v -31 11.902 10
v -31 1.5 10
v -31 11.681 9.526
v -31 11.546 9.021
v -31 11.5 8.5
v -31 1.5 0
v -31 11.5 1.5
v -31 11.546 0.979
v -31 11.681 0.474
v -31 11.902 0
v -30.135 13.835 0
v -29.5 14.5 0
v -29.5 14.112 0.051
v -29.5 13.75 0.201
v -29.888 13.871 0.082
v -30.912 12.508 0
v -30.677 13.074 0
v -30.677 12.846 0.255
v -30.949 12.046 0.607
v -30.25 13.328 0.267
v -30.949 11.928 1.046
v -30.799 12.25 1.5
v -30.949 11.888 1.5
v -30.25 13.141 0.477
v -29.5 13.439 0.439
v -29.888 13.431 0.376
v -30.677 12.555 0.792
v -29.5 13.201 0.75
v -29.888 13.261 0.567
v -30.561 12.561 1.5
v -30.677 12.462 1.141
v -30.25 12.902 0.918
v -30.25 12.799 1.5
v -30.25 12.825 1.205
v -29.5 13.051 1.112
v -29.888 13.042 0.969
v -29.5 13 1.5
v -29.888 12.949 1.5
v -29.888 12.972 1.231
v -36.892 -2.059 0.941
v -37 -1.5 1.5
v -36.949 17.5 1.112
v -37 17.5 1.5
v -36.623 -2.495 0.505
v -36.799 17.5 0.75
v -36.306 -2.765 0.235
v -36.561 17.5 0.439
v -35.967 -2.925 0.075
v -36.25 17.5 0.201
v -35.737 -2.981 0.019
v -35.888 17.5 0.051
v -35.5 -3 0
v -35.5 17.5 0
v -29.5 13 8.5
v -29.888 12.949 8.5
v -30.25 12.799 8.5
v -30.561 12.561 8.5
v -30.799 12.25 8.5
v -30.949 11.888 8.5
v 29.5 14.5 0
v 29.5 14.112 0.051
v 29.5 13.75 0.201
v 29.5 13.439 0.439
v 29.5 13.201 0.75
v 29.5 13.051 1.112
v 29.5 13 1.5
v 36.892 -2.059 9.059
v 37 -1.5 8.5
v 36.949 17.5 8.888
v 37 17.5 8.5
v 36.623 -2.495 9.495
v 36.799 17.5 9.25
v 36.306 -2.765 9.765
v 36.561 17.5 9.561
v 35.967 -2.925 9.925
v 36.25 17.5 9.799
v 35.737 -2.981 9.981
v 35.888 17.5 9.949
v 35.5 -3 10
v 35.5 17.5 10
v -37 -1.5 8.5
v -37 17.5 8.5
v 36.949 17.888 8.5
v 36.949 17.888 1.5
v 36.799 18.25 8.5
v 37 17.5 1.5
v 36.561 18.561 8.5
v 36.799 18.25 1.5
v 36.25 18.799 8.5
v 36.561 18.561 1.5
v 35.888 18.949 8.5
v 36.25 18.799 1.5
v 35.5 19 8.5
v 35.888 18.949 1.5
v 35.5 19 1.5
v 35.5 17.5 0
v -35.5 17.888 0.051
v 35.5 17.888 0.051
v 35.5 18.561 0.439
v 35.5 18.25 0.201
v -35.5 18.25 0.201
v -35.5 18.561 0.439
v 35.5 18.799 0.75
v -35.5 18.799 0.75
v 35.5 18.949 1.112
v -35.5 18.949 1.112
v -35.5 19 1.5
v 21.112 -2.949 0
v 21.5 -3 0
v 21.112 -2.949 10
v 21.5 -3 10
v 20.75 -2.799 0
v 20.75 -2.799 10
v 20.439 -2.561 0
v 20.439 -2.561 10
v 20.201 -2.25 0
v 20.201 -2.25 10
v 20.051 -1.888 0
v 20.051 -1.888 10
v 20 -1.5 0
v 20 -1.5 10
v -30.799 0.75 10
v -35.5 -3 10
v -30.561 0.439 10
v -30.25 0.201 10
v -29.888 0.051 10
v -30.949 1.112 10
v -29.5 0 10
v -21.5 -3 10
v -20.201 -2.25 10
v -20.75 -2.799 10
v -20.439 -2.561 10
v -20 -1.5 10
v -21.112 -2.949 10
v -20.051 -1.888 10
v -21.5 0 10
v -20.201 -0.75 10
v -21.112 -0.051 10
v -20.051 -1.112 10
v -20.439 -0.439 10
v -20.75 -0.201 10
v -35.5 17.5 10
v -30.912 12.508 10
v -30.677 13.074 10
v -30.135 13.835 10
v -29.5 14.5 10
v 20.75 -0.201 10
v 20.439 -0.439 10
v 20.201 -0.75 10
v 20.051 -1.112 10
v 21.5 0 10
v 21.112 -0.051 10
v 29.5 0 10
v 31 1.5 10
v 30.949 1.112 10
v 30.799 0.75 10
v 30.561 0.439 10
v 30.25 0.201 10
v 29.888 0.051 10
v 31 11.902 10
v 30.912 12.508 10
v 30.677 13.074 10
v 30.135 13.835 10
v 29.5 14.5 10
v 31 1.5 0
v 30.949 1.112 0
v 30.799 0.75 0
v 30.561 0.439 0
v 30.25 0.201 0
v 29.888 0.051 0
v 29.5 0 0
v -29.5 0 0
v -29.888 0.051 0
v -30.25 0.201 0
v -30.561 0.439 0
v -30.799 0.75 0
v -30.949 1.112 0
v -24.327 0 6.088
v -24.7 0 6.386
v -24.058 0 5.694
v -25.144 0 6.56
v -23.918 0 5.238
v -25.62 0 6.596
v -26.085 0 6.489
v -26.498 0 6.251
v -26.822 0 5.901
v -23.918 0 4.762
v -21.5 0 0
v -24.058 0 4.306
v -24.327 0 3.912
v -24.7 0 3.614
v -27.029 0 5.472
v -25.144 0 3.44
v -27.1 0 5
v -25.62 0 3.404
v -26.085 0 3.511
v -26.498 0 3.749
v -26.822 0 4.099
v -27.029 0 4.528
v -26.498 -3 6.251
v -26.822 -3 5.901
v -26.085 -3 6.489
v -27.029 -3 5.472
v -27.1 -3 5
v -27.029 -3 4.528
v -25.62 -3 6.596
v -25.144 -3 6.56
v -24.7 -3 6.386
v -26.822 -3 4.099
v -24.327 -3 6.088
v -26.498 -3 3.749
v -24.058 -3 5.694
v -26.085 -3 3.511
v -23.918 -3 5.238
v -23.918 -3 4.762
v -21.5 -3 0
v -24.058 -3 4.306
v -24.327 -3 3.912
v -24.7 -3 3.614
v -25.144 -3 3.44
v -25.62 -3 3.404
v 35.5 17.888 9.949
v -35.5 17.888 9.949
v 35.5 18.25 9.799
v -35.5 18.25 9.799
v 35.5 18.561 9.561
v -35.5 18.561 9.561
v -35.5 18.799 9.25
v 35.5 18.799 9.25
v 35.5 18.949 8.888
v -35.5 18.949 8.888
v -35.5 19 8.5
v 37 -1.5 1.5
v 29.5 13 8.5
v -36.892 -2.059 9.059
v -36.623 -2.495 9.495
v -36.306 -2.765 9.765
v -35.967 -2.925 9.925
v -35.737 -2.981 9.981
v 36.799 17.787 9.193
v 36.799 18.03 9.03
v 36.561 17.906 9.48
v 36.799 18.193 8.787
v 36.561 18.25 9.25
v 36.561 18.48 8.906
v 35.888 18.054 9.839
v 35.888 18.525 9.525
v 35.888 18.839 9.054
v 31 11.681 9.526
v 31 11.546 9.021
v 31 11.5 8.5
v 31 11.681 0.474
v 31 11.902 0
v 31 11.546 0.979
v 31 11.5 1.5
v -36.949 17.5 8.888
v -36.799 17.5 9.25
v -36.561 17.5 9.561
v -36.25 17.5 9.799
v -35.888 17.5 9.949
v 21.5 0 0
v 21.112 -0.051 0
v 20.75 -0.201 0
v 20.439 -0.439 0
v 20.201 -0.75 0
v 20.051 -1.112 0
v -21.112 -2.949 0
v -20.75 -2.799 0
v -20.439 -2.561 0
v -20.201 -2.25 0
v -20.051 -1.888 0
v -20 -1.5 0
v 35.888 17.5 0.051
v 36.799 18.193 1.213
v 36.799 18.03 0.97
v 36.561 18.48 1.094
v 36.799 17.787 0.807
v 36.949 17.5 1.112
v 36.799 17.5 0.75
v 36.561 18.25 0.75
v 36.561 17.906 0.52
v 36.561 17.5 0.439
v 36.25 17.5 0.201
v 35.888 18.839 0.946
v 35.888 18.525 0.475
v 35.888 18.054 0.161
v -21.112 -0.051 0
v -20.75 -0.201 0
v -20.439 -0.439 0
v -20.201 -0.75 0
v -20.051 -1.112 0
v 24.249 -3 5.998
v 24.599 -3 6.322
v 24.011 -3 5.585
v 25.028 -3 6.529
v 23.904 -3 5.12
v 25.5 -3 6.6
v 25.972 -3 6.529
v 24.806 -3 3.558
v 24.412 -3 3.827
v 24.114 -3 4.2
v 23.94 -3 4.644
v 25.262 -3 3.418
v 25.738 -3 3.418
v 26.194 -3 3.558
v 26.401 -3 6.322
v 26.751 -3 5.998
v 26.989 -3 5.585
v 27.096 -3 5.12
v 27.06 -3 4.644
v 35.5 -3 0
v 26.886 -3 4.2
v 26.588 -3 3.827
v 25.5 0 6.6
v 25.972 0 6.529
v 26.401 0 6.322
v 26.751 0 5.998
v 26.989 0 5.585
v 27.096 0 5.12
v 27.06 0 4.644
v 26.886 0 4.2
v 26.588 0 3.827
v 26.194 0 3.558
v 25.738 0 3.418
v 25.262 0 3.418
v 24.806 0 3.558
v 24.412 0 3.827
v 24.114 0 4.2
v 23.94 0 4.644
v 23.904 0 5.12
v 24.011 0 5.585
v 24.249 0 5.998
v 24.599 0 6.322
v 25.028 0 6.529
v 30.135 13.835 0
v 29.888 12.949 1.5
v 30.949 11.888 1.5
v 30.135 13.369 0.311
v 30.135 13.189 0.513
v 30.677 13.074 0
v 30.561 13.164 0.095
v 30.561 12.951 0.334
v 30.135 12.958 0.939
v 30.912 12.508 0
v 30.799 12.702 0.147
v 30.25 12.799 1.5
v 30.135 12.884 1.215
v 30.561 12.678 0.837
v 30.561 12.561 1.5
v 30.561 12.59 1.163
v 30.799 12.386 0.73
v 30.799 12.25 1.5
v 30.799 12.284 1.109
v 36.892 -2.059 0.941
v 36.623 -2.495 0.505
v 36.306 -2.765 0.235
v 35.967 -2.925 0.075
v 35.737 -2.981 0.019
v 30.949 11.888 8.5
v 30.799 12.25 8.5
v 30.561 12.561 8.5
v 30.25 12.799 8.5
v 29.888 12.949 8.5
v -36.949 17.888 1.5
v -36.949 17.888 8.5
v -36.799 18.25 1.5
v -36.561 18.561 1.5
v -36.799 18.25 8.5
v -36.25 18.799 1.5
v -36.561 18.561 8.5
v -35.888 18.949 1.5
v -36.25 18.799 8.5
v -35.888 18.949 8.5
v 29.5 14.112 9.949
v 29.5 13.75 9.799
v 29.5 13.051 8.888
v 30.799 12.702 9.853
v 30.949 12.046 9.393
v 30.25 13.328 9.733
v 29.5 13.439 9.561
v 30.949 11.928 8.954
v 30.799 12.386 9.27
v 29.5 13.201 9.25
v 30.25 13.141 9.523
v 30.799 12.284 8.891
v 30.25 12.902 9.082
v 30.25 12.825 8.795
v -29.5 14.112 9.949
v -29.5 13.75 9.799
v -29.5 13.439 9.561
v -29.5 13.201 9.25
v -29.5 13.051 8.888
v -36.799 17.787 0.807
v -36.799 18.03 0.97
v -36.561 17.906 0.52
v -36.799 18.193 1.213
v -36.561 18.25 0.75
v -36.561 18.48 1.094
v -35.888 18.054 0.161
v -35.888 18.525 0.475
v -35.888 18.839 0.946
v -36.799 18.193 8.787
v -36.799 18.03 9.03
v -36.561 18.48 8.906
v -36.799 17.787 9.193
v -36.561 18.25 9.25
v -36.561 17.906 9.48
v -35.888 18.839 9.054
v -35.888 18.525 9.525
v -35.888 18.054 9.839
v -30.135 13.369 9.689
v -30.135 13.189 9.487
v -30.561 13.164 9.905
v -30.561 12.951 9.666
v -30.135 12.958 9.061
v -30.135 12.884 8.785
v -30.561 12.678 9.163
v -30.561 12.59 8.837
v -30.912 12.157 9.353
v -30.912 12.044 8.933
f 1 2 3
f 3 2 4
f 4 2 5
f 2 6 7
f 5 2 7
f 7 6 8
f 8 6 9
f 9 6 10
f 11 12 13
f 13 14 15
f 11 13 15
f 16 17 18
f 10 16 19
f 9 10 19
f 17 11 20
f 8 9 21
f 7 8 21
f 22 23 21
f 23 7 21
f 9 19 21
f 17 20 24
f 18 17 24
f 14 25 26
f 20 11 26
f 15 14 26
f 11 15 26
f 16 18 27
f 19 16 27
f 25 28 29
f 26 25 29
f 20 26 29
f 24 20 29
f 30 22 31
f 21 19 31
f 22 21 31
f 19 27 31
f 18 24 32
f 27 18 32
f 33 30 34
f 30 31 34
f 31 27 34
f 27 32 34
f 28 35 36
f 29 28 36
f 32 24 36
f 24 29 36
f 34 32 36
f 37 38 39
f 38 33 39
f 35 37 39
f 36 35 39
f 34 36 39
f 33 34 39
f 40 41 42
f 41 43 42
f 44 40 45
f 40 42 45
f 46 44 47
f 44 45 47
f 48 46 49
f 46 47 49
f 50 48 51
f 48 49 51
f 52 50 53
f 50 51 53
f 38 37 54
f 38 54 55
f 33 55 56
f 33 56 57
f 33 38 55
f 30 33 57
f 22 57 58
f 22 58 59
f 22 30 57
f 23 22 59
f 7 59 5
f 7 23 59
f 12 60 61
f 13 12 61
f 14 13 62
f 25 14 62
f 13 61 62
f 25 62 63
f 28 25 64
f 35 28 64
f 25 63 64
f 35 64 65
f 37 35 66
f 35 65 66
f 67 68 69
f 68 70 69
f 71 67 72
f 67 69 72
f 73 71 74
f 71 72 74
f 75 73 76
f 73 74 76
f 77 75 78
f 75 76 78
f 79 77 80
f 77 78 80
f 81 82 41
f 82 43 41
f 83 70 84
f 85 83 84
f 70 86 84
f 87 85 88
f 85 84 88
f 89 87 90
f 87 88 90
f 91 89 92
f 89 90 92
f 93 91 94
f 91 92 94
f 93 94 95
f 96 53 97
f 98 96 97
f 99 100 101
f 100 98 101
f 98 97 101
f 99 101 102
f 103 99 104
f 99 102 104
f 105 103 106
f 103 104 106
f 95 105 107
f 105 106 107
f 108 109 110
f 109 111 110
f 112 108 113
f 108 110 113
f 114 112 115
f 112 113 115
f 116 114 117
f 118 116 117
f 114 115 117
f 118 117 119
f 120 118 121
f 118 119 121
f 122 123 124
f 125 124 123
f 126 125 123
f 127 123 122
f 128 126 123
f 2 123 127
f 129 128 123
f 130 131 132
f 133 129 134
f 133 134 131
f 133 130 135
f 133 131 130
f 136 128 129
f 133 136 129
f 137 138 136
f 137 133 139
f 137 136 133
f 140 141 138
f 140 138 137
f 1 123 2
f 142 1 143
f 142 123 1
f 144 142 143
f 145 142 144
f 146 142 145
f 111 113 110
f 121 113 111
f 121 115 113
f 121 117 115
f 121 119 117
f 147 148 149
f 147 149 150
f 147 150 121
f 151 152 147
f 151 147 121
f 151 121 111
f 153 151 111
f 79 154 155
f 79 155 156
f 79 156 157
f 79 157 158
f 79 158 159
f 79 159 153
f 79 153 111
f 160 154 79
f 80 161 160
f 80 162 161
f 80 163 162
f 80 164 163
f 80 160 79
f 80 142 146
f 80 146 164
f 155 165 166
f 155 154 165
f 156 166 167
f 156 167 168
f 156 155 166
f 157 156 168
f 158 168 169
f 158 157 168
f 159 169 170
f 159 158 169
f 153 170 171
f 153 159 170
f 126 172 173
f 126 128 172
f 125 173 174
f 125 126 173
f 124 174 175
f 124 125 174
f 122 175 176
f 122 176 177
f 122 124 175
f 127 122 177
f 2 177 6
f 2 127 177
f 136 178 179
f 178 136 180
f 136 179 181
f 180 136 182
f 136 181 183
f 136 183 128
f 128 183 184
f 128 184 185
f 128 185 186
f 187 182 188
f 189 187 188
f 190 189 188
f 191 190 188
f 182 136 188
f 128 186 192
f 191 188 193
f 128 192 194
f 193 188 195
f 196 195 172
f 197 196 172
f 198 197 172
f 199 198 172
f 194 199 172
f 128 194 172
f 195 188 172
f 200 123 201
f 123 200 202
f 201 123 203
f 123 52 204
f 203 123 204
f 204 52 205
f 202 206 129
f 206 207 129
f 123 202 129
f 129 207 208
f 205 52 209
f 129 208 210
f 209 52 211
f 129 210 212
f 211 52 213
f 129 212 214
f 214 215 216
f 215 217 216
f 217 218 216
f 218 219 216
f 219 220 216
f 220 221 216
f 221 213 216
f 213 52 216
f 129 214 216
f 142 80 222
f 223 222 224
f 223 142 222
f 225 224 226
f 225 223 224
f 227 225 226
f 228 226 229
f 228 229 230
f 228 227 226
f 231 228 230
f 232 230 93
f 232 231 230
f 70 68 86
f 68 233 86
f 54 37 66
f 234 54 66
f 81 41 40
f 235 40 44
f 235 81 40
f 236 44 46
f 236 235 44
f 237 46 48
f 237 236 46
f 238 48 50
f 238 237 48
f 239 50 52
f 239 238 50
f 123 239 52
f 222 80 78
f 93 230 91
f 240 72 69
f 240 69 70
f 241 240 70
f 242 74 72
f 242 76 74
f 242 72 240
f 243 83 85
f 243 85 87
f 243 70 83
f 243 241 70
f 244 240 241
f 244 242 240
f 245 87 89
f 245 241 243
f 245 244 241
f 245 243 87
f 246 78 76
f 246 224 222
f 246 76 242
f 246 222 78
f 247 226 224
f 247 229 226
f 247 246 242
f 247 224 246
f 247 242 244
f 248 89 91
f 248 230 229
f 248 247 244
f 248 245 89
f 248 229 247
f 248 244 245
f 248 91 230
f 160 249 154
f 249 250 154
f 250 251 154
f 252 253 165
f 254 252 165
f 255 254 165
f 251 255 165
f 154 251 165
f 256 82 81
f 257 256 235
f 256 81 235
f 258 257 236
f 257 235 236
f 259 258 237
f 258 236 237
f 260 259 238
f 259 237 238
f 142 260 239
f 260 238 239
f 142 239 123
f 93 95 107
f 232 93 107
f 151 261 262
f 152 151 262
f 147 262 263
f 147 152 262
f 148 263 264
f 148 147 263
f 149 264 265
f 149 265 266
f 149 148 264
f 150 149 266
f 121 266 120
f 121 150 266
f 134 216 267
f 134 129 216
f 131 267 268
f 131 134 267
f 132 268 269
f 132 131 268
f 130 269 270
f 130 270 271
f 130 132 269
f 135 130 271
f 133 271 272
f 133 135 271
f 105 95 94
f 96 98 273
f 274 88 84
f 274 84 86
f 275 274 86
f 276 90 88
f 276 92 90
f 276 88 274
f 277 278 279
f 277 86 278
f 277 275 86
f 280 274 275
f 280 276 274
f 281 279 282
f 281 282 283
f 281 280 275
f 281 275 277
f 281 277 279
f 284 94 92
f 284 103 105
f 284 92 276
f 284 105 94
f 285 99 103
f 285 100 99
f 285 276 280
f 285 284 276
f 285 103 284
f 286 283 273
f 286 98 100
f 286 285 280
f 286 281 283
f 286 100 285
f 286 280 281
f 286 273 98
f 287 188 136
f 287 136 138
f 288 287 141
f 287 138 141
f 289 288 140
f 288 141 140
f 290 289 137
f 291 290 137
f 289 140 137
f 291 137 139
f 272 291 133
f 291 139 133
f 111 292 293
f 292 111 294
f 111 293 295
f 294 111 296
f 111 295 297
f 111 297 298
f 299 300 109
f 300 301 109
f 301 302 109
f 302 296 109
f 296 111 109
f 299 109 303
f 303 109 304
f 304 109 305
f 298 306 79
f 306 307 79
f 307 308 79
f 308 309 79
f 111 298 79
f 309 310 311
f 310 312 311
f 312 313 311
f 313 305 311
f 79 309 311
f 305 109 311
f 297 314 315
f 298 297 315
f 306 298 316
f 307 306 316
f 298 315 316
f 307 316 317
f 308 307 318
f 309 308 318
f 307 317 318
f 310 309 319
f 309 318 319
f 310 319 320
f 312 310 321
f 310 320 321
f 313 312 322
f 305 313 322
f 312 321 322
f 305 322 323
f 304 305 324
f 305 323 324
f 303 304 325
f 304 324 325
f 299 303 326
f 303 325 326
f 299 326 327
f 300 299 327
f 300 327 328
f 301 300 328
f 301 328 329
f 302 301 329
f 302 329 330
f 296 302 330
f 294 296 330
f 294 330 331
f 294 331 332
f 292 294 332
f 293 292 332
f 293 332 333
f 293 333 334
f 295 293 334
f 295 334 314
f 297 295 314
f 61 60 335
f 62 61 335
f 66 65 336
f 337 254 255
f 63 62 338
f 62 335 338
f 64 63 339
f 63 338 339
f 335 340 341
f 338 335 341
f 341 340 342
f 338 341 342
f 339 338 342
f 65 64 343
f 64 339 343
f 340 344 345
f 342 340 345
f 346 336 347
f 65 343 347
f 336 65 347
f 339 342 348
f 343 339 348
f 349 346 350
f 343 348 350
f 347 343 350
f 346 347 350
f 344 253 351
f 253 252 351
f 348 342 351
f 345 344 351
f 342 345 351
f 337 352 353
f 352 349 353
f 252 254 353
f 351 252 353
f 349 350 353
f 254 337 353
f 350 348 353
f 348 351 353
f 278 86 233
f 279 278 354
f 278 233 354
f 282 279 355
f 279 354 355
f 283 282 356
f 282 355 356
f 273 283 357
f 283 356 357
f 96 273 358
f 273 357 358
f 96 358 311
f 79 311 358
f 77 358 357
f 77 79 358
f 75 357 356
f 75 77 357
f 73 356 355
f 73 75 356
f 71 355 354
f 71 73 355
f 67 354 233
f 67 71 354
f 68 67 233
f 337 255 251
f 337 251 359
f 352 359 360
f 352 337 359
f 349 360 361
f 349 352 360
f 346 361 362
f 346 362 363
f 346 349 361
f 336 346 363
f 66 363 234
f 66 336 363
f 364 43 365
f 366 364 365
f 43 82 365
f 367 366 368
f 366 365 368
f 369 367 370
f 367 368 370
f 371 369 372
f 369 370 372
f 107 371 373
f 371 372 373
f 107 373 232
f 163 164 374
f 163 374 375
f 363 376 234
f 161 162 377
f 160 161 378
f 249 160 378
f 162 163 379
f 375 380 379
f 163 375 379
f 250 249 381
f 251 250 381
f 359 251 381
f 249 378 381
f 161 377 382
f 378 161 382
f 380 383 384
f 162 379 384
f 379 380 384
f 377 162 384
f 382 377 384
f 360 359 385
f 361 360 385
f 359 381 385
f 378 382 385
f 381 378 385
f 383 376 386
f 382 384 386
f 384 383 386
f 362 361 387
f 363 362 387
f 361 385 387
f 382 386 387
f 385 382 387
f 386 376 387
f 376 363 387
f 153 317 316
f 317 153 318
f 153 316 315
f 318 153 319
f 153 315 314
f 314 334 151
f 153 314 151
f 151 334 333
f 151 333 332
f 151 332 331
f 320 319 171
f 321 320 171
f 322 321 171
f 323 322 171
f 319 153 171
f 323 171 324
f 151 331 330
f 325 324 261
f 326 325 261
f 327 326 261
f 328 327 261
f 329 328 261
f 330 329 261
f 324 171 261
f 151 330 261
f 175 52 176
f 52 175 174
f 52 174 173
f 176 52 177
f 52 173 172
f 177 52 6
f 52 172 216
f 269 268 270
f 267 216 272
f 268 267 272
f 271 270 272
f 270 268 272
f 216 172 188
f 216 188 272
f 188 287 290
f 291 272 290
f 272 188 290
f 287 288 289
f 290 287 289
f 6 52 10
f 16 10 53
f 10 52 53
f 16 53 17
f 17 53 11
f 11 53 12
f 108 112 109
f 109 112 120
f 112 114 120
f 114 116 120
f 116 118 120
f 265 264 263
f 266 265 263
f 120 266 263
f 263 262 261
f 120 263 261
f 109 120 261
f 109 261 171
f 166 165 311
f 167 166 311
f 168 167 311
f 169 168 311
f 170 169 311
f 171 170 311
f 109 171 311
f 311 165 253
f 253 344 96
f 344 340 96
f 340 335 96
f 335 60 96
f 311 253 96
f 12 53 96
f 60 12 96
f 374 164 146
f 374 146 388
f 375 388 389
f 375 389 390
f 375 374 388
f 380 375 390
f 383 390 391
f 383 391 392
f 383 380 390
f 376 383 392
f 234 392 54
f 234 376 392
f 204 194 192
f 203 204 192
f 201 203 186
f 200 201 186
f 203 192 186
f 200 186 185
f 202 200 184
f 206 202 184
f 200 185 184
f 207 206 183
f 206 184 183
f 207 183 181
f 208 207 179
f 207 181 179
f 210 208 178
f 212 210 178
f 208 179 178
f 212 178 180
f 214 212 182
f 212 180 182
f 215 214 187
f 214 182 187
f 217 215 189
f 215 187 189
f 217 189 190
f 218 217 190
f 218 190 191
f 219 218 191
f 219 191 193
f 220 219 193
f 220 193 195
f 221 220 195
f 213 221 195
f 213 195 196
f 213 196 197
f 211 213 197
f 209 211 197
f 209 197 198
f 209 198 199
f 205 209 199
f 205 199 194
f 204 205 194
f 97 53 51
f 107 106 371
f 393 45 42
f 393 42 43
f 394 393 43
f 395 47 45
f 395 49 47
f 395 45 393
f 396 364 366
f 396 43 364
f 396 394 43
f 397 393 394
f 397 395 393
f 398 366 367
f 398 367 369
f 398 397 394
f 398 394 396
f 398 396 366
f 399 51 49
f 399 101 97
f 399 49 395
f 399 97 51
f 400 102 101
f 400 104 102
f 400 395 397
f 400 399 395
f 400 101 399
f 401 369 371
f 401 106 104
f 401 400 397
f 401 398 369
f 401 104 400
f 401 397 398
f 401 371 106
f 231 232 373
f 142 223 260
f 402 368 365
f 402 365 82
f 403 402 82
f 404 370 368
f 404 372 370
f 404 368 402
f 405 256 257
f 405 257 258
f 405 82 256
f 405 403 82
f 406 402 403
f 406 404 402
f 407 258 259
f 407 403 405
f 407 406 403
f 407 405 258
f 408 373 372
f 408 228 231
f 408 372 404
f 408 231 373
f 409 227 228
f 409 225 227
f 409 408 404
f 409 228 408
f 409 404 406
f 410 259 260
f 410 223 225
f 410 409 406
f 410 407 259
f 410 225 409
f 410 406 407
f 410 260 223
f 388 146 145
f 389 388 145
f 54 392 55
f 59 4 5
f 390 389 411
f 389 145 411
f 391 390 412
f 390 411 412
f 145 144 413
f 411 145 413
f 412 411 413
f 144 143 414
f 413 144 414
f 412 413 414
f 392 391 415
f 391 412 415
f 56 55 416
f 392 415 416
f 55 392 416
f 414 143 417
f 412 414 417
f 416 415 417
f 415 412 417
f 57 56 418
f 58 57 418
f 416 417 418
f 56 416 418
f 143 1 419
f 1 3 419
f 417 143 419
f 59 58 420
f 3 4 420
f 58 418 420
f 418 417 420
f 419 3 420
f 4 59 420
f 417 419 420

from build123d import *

# Parameters (mm, degrees)
RESSALTO_EXTRUS_O1_DEPTH = 10
CORTE_EXTRUS_O1_REACH    = 44.778
ESBO_O2_R                = 1.6
FILETE1_R                = 1.5
FILETE2_R                = 1.5
FILETE3_R                = 1.5


# Some blends are built 0.0001 mm under size
with BuildPart() as part:
    # Esboço1 → Ressalto-extrusão1 (new body)
    with BuildSketch(Plane.XY):
        Polygon((-37, -3), (-20, -3), (-20, 0), (-31, 0), (-31, 13), (31, 13), (31, 0), (20, 0), (20, -3), (37, -3), (37, 19), (-37, 19), align=None)
    extrude(amount=RESSALTO_EXTRUS_O1_DEPTH)

    # Esboço2 → Corte-extrusão1 (cut, up to next)
    with BuildSketch(Plane(origin=(0, 0, 0), x_dir=(1, 0, 0), z_dir=(0, 1, 0)), mode=Mode.PRIVATE) as corte_extrus_o1_sk1:
        with Locations(Location((-25.5, -5, 0), (0, 0, 180))):
            Circle(ESBO_O2_R)
    corte_extrus_o1_tool1 = extrude(corte_extrus_o1_sk1.sketch, amount=-CORTE_EXTRUS_O1_REACH, mode=Mode.PRIVATE) & part.part
    # Esboço2 → Corte-extrusão1 (cut, up to next)
    with BuildSketch(Plane(origin=(0, 0, 0), x_dir=(1, 0, 0), z_dir=(0, 1, 0)), mode=Mode.PRIVATE) as corte_extrus_o1_sk2:
        with Locations(Location((25.5, -5, 0), (0, 0, 270))):
            Circle(ESBO_O2_R)
    corte_extrus_o1_tool2 = extrude(corte_extrus_o1_sk2.sketch, amount=-CORTE_EXTRUS_O1_REACH, mode=Mode.PRIVATE) & part.part
    add(corte_extrus_o1_tool1.solids().sort_by_distance((-25.5, 0, 5))[0], mode=Mode.SUBTRACT)
    add(corte_extrus_o1_tool2.solids().sort_by_distance((25.5, 0, 5))[0], mode=Mode.SUBTRACT)

    # Filete1
    filete1_edges = [part.edges().sort_by_distance(p)[0] for p in [
        (0, 19, 0),
        (0, 13, 0),
        (0, 13, 10),
        (0, 19, 10),
    ]]
    fillet(filete1_edges, radius=FILETE1_R)

    # Filete2
    filete2_edges = [part.edges().sort_by_distance(p)[0] for p in [
        (37, 7.25, 10),
        (37, 18.560660172, 9.560660172),
        (37, 7.25, 0),
        (37, 18.560660172, 0.439339828),
        (-37, 7.25, 10),
        (-37, 18.560660172, 9.560660172),
        (-37, 7.25, 0),
        (-37, 18.560660172, 0.439339828),
        (37, 19, 5),
        (-37, 19, 5),
        (-20, -3, 5),
        (20, -3, 5),
        (-20, 0, 5),
        (20, 0, 5),
        (31, 0, 5),
        (-31, 0, 5),
        (-37, -3, 5),
        (37, -3, 5),
    ]]
    fillet(filete2_edges, radius=FILETE2_R - 0.0001)  # a hair under: the kernel refuses the full size

    # Filete3
    # the kernel refuses this fillet: 1.5 mm, written as the material it adds along each edge
    with BuildSketch(Plane(origin=(31, 13, 1.5), x_dir=(0, -1, 0), z_dir=(0, 0, 1))) as filete3_piece_1:
        with BuildLine():
            CenterArc((FILETE3_R, -FILETE3_R), FILETE3_R, 90, 90)
            Line((0, -FILETE3_R), (0, 0))
            Line((0, 0), (FILETE3_R, 0))
        make_face()
    extrude(amount=7)
    with BuildSketch(Plane(origin=(-31, 13, 1.5), x_dir=(0, -1, 0), z_dir=(0, 0, 1))) as filete3_piece_2:
        with BuildLine():
            CenterArc((FILETE3_R, FILETE3_R), FILETE3_R, 180, 90)
            Line((0, FILETE3_R), (0, 0))
            Line((0, 0), (FILETE3_R, 0))
        make_face()
    extrude(amount=7)
    with BuildSketch(Plane(origin=(31, 14.5, 8.5), x_dir=(0, 0.5976672776328287, -0.8017442392976475), z_dir=(0, -0.8017442392976475, -0.5976672776328287))) as filete3_piece_3_section:
        with BuildLine():
            CenterArc((1.5 + FILETE3_R, -FILETE3_R), FILETE3_R, 90, 90)
            Line((1.5, -FILETE3_R), (1.5, 0))
            Line((1.5, 0), (1.5 + FILETE3_R, 0))
        make_face()
    filete3_piece_3 = revolve(axis=Axis((31, 14.5, 8.5), (1, 0, 0)), revolution_arc=233.296989237, mode=Mode.PRIVATE)
    filete3_piece_3 = split(filete3_piece_3, bisect_by=Plane(origin=(30.532557549, 13.375091575, 10), z_dir=(0, 0, -1)), keep=Keep.TOP, mode=Mode.PRIVATE)
    add(filete3_piece_3)
    with BuildSketch(Plane(origin=(-31, 14.5, 8.5), x_dir=(0, 0.5976672776328287, -0.8017442392976475), z_dir=(0, -0.8017442392976475, -0.5976672776328287))) as filete3_piece_4_section:
        with BuildLine():
            CenterArc((1.5 + FILETE3_R, FILETE3_R), FILETE3_R, 180, 90)
            Line((1.5, FILETE3_R), (1.5, 0))
            Line((1.5, 0), (1.5 + FILETE3_R, 0))
        make_face()
    filete3_piece_4 = revolve(axis=Axis((-31, 14.5, 8.5), (1, 0, 0)), revolution_arc=233.296989237, mode=Mode.PRIVATE)
    filete3_piece_4 = split(filete3_piece_4, bisect_by=Plane(origin=(-30.532557659, 13.37509149, 10), z_dir=(0, 0, -1)), keep=Keep.TOP, mode=Mode.PRIVATE)
    add(filete3_piece_4)
    with BuildSketch(Plane(origin=(31, 14.5, 1.5), x_dir=(0, 0.5976672776328277, 0.8017442392976482), z_dir=(0, -0.8017442392976482, 0.5976672776328277))) as filete3_piece_5_section:
        with BuildLine():
            CenterArc((1.5 + FILETE3_R, FILETE3_R), FILETE3_R, 180, 90)
            Line((1.5, FILETE3_R), (1.5, 0))
            Line((1.5, 0), (1.5 + FILETE3_R, 0))
        make_face()
    filete3_piece_5 = revolve(axis=Axis((31, 14.5, 1.5), (-1, 0, 0)), revolution_arc=233.296989237, mode=Mode.PRIVATE)
    filete3_piece_5 = split(filete3_piece_5, bisect_by=Plane(origin=(30.532557549, 13.375091575, 0), z_dir=(0, 0, 1)), keep=Keep.TOP, mode=Mode.PRIVATE)
    add(filete3_piece_5)
    with BuildSketch(Plane(origin=(-31, 14.5, 1.5), x_dir=(0, 0.5976672776328277, 0.8017442392976482), z_dir=(0, -0.8017442392976482, 0.5976672776328277))) as filete3_piece_6_section:
        with BuildLine():
            CenterArc((1.5 + FILETE3_R, -FILETE3_R), FILETE3_R, 90, 90)
            Line((1.5, -FILETE3_R), (1.5, 0))
            Line((1.5, 0), (1.5 + FILETE3_R, 0))
        make_face()
    filete3_piece_6 = revolve(axis=Axis((-31, 14.5, 1.5), (-1, 0, 0)), revolution_arc=233.296989237, mode=Mode.PRIVATE)
    filete3_piece_6 = split(filete3_piece_6, bisect_by=Plane(origin=(-30.532557571, 13.375091573, 0), z_dir=(0, 0, 1)), keep=Keep.TOP, mode=Mode.PRIVATE)
    add(filete3_piece_6)


solid = part.part
